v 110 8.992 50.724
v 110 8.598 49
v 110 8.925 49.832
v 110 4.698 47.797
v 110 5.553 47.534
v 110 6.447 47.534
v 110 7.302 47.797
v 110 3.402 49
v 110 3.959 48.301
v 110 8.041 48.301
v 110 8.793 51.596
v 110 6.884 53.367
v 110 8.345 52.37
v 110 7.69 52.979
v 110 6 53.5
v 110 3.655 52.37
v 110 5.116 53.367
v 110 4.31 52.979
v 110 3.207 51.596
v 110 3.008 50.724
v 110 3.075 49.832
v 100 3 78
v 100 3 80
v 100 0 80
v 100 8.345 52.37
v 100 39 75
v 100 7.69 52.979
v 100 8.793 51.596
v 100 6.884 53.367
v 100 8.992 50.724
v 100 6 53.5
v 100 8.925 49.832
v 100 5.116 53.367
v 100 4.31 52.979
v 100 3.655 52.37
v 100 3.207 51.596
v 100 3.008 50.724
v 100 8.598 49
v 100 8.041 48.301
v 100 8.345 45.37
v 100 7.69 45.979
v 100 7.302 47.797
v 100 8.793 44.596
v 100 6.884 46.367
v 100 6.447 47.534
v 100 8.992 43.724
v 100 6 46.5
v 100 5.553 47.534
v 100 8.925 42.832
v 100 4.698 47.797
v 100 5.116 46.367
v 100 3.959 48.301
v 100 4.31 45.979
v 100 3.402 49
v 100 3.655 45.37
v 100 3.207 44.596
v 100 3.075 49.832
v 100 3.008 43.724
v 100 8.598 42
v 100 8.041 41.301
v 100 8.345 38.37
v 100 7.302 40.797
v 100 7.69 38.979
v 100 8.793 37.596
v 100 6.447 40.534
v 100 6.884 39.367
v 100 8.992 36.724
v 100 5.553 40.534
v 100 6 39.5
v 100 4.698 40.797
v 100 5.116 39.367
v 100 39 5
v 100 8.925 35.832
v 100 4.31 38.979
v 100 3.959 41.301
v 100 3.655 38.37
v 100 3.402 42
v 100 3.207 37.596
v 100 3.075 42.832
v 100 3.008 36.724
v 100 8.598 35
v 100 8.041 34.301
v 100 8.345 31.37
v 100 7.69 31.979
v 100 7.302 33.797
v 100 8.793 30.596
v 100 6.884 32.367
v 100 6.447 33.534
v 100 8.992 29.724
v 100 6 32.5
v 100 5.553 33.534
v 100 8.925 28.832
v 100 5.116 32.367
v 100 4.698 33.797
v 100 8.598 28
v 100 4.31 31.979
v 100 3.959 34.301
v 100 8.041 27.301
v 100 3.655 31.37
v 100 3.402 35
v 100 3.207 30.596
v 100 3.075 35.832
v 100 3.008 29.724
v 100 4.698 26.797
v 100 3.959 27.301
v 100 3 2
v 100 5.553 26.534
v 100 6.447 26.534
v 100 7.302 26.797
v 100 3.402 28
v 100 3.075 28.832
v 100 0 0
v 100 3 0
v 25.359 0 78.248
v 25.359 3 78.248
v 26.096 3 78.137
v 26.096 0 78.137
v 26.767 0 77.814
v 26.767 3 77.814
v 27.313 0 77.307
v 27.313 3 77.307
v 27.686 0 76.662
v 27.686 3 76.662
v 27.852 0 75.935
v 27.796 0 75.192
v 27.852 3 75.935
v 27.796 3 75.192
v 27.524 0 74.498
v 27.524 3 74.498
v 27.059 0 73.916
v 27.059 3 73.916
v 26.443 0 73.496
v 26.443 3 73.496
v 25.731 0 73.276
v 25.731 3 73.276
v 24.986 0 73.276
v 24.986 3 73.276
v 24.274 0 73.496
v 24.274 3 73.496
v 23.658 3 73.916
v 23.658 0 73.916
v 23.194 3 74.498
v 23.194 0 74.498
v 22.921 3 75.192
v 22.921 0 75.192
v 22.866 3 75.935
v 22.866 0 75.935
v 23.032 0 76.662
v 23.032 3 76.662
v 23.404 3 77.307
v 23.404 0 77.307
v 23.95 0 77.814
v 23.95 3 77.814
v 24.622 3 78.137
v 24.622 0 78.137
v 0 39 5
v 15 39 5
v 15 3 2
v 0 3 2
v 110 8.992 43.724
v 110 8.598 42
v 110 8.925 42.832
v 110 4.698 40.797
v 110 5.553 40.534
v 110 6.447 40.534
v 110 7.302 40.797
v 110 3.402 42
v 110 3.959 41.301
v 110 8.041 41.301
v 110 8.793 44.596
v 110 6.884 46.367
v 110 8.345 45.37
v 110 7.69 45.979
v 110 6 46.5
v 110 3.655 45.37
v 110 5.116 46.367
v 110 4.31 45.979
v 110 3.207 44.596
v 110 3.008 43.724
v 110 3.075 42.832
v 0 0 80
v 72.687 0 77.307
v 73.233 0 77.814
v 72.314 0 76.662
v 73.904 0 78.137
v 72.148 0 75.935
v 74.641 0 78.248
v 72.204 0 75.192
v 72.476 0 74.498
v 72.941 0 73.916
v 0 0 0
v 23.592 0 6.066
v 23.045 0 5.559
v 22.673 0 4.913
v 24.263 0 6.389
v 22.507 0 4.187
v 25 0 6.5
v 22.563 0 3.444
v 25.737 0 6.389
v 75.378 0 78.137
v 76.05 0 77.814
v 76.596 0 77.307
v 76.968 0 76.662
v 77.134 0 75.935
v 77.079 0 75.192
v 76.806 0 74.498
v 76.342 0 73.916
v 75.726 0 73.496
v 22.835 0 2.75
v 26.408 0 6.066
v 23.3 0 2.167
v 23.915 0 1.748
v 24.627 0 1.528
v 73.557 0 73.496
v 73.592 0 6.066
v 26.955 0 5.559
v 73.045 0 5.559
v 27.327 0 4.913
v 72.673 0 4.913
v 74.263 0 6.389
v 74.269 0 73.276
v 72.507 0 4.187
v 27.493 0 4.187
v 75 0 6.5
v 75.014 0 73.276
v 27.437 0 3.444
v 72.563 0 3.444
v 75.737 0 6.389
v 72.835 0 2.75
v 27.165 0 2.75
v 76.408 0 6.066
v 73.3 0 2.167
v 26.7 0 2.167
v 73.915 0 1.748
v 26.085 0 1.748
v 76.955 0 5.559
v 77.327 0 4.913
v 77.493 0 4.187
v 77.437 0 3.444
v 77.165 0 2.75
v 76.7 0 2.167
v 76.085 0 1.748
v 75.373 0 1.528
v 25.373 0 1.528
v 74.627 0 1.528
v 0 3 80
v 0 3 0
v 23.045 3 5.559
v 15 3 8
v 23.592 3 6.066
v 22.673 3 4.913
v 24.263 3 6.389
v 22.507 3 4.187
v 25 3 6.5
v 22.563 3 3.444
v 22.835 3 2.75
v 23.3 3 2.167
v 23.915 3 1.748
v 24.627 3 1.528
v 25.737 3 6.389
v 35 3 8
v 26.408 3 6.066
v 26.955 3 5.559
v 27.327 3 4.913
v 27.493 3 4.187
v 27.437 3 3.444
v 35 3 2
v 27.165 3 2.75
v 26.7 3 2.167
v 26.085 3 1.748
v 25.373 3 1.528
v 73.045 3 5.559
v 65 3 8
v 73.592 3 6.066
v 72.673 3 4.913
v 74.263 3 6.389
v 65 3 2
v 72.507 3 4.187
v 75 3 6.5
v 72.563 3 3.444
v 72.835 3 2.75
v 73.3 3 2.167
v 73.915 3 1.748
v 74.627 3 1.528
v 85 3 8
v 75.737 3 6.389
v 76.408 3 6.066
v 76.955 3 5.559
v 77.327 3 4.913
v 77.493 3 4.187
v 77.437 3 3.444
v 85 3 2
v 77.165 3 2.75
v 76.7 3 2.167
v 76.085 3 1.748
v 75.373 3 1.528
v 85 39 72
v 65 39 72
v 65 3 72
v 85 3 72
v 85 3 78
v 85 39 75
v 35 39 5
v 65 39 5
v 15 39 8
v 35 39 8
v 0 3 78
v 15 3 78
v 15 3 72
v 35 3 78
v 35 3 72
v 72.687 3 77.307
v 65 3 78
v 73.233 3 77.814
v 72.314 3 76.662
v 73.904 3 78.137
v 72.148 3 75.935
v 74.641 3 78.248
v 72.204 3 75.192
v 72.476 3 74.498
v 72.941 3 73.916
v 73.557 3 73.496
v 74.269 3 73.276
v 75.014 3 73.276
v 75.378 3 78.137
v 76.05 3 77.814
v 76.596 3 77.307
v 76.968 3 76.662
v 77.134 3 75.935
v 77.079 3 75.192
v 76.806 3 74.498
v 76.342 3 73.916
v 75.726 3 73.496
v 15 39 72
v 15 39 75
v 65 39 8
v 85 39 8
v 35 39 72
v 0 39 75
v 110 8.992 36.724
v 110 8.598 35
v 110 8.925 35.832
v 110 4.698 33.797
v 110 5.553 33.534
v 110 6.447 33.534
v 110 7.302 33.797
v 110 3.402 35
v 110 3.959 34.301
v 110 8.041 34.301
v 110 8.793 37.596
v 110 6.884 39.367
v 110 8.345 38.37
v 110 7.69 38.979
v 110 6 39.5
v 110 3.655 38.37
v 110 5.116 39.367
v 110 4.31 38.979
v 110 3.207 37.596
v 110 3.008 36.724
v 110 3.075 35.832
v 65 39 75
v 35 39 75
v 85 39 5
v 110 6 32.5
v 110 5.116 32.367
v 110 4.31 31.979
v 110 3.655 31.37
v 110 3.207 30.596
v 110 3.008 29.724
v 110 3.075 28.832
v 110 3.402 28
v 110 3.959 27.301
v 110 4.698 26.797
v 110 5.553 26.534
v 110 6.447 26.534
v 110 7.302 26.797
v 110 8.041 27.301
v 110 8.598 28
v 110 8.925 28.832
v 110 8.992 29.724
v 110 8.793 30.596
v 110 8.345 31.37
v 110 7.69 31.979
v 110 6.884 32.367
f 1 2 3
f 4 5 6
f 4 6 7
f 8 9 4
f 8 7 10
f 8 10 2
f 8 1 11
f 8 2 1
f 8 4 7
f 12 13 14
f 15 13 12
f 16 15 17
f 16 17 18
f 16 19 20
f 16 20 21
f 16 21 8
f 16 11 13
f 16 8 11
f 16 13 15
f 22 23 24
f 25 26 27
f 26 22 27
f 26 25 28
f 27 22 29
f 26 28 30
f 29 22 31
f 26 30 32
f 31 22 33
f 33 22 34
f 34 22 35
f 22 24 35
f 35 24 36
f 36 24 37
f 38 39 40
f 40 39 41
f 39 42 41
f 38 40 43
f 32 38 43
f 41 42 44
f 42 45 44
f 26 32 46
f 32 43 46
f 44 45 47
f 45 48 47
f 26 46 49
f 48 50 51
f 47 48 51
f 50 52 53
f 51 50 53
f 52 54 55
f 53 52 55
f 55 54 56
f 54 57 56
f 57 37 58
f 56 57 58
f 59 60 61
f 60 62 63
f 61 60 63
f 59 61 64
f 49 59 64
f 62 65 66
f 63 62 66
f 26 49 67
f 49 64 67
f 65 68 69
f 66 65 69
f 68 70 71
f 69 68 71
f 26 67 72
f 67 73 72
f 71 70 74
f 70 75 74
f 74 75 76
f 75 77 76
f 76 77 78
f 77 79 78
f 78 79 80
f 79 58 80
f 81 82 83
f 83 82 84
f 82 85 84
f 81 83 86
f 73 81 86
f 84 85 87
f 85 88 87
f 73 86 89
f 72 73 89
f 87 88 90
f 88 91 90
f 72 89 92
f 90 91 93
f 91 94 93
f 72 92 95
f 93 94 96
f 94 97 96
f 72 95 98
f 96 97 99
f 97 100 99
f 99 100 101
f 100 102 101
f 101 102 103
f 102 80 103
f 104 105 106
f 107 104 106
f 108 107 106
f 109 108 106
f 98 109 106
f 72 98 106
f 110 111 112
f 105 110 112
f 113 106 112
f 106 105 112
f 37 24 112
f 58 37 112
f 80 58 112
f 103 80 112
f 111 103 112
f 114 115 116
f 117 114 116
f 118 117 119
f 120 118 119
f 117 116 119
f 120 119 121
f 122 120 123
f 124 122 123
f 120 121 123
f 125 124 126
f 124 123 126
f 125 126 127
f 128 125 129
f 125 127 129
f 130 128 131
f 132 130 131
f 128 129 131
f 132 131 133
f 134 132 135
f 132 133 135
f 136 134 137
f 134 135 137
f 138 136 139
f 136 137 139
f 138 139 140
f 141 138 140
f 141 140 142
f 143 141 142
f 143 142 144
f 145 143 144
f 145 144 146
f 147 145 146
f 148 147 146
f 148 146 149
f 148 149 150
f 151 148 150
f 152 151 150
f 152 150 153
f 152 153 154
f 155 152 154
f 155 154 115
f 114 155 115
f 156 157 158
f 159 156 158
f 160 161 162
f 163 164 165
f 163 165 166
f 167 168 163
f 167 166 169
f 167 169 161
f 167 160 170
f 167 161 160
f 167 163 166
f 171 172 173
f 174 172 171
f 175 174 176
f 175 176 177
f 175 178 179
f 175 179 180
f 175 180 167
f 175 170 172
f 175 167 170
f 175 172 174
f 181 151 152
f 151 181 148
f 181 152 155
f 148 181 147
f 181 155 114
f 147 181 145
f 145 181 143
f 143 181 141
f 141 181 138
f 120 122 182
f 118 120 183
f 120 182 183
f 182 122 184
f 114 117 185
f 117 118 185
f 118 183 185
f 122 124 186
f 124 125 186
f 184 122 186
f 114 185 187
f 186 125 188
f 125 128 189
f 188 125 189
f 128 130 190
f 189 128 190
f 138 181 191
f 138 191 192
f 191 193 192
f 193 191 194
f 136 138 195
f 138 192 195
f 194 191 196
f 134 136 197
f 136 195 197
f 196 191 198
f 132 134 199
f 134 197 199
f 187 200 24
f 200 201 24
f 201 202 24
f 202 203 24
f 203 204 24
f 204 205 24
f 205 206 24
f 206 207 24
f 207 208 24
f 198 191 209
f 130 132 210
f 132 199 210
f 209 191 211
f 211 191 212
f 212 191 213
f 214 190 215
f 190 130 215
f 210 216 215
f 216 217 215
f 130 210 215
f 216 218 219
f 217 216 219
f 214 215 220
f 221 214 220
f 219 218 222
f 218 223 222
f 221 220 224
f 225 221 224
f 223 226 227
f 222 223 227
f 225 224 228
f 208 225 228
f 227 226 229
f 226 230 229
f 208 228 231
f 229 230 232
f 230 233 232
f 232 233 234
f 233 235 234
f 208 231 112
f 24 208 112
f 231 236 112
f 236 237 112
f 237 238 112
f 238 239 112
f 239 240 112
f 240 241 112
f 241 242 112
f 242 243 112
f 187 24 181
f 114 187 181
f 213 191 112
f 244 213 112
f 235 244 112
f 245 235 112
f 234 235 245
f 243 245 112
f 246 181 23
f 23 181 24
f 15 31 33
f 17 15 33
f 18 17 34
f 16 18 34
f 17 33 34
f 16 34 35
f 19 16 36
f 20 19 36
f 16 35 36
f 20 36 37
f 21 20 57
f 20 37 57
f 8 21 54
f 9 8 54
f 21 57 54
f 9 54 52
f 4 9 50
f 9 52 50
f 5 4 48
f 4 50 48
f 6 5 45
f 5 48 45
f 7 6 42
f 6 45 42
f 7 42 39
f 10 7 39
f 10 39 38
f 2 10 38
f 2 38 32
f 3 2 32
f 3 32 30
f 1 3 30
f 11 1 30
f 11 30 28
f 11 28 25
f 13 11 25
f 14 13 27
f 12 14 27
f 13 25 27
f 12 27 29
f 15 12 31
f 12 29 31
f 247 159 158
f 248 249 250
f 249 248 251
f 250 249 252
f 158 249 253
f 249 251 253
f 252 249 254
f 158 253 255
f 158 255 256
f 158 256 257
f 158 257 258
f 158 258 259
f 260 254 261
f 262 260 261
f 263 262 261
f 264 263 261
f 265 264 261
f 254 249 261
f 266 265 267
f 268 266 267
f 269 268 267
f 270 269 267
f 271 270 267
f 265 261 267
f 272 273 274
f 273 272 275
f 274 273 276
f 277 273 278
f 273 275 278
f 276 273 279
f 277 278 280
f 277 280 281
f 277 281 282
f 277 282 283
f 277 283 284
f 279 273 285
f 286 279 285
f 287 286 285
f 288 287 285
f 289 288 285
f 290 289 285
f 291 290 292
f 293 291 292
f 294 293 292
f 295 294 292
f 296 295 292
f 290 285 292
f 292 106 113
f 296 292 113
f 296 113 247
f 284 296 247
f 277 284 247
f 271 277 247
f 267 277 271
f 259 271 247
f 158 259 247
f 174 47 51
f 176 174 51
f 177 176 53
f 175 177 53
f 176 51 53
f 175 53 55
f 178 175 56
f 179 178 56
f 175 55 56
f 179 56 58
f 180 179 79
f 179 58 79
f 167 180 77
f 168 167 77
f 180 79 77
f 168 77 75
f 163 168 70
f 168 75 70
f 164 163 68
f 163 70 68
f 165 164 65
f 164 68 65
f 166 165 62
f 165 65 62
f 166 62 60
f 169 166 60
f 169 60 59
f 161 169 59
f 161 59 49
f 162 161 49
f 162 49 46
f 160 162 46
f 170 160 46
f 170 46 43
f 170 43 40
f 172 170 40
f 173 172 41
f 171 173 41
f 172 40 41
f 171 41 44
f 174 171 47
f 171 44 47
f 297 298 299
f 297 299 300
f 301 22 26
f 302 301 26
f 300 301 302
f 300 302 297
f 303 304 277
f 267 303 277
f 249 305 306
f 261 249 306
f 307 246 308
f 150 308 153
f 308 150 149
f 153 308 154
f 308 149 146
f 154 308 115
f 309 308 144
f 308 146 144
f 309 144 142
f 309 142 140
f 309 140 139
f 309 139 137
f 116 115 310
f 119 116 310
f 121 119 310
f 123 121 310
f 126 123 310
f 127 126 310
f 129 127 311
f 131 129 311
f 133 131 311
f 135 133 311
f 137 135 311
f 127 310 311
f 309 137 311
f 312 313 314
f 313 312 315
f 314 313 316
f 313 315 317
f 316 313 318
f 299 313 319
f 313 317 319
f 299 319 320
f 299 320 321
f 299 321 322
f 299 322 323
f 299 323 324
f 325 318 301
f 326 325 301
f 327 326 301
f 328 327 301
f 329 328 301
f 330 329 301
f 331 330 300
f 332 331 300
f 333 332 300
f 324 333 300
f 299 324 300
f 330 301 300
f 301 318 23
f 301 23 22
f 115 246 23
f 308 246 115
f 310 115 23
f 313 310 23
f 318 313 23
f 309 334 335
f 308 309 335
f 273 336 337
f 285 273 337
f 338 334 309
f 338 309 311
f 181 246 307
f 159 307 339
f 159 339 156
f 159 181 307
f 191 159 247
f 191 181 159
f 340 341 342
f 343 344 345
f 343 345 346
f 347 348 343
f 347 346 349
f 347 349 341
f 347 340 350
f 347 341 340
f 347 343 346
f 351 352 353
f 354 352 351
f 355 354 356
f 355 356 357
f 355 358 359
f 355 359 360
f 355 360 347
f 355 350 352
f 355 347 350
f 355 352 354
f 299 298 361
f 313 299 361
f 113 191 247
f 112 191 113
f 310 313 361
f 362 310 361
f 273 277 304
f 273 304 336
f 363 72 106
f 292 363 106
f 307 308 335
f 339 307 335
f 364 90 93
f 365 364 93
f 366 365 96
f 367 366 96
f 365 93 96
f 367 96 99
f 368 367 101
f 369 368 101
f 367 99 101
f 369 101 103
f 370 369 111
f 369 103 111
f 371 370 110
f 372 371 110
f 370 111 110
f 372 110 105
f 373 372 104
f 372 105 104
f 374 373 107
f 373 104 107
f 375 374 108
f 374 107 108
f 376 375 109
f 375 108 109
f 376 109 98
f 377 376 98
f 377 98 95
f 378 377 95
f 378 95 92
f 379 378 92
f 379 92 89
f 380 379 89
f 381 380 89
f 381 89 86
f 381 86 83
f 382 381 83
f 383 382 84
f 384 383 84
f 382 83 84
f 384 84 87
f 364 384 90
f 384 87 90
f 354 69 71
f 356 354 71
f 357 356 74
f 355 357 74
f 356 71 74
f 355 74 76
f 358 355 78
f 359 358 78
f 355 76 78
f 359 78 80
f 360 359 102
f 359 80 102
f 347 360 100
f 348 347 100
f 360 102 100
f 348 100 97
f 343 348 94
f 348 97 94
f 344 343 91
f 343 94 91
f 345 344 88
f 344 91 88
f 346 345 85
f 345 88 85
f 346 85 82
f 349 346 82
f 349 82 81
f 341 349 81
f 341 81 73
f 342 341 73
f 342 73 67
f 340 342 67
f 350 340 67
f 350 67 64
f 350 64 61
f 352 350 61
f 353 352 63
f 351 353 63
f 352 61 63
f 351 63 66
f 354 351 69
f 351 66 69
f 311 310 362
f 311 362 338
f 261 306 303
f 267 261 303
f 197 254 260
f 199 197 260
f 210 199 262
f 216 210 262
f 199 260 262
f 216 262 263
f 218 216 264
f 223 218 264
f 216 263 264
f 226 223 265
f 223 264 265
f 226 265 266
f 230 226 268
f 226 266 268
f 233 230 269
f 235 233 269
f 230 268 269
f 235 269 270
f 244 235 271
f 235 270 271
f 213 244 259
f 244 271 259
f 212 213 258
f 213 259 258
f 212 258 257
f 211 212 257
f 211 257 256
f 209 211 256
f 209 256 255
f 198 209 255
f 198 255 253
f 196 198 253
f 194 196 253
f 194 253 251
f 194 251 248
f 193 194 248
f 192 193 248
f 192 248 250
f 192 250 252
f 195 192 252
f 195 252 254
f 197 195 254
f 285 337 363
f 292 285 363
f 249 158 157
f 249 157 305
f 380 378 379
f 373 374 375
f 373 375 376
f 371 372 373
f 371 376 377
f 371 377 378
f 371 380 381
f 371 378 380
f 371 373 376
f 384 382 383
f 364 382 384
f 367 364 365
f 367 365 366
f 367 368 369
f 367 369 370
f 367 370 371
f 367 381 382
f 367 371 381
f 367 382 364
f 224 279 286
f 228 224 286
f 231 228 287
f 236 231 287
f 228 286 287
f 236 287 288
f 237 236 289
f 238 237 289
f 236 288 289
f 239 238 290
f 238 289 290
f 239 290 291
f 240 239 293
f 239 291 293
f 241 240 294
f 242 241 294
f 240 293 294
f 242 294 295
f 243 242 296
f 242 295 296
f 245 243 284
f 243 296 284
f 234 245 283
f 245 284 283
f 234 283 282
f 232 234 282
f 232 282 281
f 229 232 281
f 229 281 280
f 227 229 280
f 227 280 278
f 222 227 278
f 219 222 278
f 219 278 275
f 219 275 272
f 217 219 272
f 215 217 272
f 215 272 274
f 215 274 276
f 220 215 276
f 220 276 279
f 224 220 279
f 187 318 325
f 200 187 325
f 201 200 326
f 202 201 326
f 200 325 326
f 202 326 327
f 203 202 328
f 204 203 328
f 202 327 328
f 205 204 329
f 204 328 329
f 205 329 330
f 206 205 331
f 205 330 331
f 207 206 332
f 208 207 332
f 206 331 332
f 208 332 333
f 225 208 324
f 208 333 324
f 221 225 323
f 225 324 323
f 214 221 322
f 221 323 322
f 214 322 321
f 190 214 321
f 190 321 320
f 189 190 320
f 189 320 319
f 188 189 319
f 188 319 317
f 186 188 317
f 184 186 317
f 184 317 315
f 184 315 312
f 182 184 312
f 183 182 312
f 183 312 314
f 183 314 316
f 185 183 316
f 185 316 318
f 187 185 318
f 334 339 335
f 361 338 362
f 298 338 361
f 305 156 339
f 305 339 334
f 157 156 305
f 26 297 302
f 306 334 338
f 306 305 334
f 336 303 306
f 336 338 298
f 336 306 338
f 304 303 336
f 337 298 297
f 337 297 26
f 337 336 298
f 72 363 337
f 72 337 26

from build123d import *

# Parameters (mm, degrees)
SKETCH_1_W          = 100
SKETCH_1_H          = 80
EXTRUDE_1_DEPTH     = 39
SKETCH_5_R          = 3
EXTRUDE_3_DEPTH     = 10
CUT_EXTRUDE_1_DEPTH = 1000
SKETCH_9_W          = 20
SKETCH_9_H          = 6.479518585
SKETCH_9_H_2        = 3
SKETCH_9_H_3        = 8.519653391
SKETCH_9_H_4        = 11.10220699
SKETCH_9_H_5        = 8.801039891
CUT_EXTRUDE_3_DEPTH = 36
SKETCH_10_R         = 2.5
CUT_EXTRUDE_4_DEPTH = 36


with BuildPart() as part:
    # 草图1 → 凸台-拉伸1 (new body)
    with BuildSketch(Plane(origin=(0, 0, 0), x_dir=(1, 0, 0), z_dir=(0, 1, 0))):
        with Locations((50, -40)):
            Rectangle(SKETCH_1_W, SKETCH_1_H)
    extrude(amount=EXTRUDE_1_DEPTH)

    # 草图5 → 凸台-拉伸3 (add)
    with BuildSketch(Plane(origin=(100, 0, 0), x_dir=(0, 0, -1), z_dir=(1, 0, 0))):
        with Locations(Location((-50.5, 6, 0), (0, 0, 180))):
            Circle(SKETCH_5_R)
        with Locations(Location((-43.5, 6, 0), (0, 0, 180))):
            Circle(SKETCH_5_R)
        with Locations(Location((-36.5, 6, 0), (0, 0, 180))):
            Circle(SKETCH_5_R)
        with Locations(Location((-29.5, 6, 0), (0, 0, 180))):
            Circle(SKETCH_5_R)
    extrude(amount=EXTRUDE_3_DEPTH)

    # 草图8 → 切除-拉伸1 (cut)
    with BuildSketch(Plane(origin=(100, 0, 0), x_dir=(0, 0, -1), z_dir=(1, 0, 0))):
        Polygon((-78, 3), (-75, 39), (-80, 39), (-80, 3), align=None)
        Polygon((0, 3), (0, 39), (-5, 39), (-2, 3), align=None)
    extrude(amount=-CUT_EXTRUDE_1_DEPTH, mode=Mode.SUBTRACT)

    # 草图9 → 切除-拉伸3 (cut)
    with BuildSketch(Plane(origin=(0, 39, 0), x_dir=(1, 0, 0), z_dir=(0, 1, 0))):
        with Locations((25, -1.760240707)):
            Rectangle(SKETCH_9_W, SKETCH_9_H)
        with Locations((25, -6.5)):
            Rectangle(SKETCH_9_W, SKETCH_9_H_2)
        with Locations((75, -0.740173304)):
            Rectangle(SKETCH_9_W, SKETCH_9_H_3)
        with Locations((75, -6.5)):
            Rectangle(SKETCH_9_W, SKETCH_9_H_2)
        with Locations((75, -80.551103495)):
            Rectangle(SKETCH_9_W, SKETCH_9_H_4)
        with Locations((75, -73.5)):
            Rectangle(SKETCH_9_W, SKETCH_9_H_2)
        with Locations((25, -79.400519946)):
            Rectangle(SKETCH_9_W, SKETCH_9_H_5)
        with Locations((25, -73.5)):
            Rectangle(SKETCH_9_W, SKETCH_9_H_2)
    extrude(amount=-CUT_EXTRUDE_3_DEPTH, mode=Mode.SUBTRACT)

    # 草图10 → 切除-拉伸4 (cut)
    with BuildSketch(Plane(origin=(0, 3, 0), x_dir=(1, 0, 0), z_dir=(0, 1, 0))):
        with Locations(Location((25, -4, 0), (0, 0, 270))):
            Circle(SKETCH_10_R)
        with Locations(Location((25.358741031, -75.748206295, 0), (0, 0, 270))):
            Circle(SKETCH_10_R)
        with Locations(Location((75, -4, 0), (0, 0, 270))):
            Circle(SKETCH_10_R)
        with Locations(Location((74.641258969, -75.748206295, 0), (0, 0, 270))):
            Circle(SKETCH_10_R)
    extrude(amount=-CUT_EXTRUDE_4_DEPTH, mode=Mode.SUBTRACT)


solid = part.part
